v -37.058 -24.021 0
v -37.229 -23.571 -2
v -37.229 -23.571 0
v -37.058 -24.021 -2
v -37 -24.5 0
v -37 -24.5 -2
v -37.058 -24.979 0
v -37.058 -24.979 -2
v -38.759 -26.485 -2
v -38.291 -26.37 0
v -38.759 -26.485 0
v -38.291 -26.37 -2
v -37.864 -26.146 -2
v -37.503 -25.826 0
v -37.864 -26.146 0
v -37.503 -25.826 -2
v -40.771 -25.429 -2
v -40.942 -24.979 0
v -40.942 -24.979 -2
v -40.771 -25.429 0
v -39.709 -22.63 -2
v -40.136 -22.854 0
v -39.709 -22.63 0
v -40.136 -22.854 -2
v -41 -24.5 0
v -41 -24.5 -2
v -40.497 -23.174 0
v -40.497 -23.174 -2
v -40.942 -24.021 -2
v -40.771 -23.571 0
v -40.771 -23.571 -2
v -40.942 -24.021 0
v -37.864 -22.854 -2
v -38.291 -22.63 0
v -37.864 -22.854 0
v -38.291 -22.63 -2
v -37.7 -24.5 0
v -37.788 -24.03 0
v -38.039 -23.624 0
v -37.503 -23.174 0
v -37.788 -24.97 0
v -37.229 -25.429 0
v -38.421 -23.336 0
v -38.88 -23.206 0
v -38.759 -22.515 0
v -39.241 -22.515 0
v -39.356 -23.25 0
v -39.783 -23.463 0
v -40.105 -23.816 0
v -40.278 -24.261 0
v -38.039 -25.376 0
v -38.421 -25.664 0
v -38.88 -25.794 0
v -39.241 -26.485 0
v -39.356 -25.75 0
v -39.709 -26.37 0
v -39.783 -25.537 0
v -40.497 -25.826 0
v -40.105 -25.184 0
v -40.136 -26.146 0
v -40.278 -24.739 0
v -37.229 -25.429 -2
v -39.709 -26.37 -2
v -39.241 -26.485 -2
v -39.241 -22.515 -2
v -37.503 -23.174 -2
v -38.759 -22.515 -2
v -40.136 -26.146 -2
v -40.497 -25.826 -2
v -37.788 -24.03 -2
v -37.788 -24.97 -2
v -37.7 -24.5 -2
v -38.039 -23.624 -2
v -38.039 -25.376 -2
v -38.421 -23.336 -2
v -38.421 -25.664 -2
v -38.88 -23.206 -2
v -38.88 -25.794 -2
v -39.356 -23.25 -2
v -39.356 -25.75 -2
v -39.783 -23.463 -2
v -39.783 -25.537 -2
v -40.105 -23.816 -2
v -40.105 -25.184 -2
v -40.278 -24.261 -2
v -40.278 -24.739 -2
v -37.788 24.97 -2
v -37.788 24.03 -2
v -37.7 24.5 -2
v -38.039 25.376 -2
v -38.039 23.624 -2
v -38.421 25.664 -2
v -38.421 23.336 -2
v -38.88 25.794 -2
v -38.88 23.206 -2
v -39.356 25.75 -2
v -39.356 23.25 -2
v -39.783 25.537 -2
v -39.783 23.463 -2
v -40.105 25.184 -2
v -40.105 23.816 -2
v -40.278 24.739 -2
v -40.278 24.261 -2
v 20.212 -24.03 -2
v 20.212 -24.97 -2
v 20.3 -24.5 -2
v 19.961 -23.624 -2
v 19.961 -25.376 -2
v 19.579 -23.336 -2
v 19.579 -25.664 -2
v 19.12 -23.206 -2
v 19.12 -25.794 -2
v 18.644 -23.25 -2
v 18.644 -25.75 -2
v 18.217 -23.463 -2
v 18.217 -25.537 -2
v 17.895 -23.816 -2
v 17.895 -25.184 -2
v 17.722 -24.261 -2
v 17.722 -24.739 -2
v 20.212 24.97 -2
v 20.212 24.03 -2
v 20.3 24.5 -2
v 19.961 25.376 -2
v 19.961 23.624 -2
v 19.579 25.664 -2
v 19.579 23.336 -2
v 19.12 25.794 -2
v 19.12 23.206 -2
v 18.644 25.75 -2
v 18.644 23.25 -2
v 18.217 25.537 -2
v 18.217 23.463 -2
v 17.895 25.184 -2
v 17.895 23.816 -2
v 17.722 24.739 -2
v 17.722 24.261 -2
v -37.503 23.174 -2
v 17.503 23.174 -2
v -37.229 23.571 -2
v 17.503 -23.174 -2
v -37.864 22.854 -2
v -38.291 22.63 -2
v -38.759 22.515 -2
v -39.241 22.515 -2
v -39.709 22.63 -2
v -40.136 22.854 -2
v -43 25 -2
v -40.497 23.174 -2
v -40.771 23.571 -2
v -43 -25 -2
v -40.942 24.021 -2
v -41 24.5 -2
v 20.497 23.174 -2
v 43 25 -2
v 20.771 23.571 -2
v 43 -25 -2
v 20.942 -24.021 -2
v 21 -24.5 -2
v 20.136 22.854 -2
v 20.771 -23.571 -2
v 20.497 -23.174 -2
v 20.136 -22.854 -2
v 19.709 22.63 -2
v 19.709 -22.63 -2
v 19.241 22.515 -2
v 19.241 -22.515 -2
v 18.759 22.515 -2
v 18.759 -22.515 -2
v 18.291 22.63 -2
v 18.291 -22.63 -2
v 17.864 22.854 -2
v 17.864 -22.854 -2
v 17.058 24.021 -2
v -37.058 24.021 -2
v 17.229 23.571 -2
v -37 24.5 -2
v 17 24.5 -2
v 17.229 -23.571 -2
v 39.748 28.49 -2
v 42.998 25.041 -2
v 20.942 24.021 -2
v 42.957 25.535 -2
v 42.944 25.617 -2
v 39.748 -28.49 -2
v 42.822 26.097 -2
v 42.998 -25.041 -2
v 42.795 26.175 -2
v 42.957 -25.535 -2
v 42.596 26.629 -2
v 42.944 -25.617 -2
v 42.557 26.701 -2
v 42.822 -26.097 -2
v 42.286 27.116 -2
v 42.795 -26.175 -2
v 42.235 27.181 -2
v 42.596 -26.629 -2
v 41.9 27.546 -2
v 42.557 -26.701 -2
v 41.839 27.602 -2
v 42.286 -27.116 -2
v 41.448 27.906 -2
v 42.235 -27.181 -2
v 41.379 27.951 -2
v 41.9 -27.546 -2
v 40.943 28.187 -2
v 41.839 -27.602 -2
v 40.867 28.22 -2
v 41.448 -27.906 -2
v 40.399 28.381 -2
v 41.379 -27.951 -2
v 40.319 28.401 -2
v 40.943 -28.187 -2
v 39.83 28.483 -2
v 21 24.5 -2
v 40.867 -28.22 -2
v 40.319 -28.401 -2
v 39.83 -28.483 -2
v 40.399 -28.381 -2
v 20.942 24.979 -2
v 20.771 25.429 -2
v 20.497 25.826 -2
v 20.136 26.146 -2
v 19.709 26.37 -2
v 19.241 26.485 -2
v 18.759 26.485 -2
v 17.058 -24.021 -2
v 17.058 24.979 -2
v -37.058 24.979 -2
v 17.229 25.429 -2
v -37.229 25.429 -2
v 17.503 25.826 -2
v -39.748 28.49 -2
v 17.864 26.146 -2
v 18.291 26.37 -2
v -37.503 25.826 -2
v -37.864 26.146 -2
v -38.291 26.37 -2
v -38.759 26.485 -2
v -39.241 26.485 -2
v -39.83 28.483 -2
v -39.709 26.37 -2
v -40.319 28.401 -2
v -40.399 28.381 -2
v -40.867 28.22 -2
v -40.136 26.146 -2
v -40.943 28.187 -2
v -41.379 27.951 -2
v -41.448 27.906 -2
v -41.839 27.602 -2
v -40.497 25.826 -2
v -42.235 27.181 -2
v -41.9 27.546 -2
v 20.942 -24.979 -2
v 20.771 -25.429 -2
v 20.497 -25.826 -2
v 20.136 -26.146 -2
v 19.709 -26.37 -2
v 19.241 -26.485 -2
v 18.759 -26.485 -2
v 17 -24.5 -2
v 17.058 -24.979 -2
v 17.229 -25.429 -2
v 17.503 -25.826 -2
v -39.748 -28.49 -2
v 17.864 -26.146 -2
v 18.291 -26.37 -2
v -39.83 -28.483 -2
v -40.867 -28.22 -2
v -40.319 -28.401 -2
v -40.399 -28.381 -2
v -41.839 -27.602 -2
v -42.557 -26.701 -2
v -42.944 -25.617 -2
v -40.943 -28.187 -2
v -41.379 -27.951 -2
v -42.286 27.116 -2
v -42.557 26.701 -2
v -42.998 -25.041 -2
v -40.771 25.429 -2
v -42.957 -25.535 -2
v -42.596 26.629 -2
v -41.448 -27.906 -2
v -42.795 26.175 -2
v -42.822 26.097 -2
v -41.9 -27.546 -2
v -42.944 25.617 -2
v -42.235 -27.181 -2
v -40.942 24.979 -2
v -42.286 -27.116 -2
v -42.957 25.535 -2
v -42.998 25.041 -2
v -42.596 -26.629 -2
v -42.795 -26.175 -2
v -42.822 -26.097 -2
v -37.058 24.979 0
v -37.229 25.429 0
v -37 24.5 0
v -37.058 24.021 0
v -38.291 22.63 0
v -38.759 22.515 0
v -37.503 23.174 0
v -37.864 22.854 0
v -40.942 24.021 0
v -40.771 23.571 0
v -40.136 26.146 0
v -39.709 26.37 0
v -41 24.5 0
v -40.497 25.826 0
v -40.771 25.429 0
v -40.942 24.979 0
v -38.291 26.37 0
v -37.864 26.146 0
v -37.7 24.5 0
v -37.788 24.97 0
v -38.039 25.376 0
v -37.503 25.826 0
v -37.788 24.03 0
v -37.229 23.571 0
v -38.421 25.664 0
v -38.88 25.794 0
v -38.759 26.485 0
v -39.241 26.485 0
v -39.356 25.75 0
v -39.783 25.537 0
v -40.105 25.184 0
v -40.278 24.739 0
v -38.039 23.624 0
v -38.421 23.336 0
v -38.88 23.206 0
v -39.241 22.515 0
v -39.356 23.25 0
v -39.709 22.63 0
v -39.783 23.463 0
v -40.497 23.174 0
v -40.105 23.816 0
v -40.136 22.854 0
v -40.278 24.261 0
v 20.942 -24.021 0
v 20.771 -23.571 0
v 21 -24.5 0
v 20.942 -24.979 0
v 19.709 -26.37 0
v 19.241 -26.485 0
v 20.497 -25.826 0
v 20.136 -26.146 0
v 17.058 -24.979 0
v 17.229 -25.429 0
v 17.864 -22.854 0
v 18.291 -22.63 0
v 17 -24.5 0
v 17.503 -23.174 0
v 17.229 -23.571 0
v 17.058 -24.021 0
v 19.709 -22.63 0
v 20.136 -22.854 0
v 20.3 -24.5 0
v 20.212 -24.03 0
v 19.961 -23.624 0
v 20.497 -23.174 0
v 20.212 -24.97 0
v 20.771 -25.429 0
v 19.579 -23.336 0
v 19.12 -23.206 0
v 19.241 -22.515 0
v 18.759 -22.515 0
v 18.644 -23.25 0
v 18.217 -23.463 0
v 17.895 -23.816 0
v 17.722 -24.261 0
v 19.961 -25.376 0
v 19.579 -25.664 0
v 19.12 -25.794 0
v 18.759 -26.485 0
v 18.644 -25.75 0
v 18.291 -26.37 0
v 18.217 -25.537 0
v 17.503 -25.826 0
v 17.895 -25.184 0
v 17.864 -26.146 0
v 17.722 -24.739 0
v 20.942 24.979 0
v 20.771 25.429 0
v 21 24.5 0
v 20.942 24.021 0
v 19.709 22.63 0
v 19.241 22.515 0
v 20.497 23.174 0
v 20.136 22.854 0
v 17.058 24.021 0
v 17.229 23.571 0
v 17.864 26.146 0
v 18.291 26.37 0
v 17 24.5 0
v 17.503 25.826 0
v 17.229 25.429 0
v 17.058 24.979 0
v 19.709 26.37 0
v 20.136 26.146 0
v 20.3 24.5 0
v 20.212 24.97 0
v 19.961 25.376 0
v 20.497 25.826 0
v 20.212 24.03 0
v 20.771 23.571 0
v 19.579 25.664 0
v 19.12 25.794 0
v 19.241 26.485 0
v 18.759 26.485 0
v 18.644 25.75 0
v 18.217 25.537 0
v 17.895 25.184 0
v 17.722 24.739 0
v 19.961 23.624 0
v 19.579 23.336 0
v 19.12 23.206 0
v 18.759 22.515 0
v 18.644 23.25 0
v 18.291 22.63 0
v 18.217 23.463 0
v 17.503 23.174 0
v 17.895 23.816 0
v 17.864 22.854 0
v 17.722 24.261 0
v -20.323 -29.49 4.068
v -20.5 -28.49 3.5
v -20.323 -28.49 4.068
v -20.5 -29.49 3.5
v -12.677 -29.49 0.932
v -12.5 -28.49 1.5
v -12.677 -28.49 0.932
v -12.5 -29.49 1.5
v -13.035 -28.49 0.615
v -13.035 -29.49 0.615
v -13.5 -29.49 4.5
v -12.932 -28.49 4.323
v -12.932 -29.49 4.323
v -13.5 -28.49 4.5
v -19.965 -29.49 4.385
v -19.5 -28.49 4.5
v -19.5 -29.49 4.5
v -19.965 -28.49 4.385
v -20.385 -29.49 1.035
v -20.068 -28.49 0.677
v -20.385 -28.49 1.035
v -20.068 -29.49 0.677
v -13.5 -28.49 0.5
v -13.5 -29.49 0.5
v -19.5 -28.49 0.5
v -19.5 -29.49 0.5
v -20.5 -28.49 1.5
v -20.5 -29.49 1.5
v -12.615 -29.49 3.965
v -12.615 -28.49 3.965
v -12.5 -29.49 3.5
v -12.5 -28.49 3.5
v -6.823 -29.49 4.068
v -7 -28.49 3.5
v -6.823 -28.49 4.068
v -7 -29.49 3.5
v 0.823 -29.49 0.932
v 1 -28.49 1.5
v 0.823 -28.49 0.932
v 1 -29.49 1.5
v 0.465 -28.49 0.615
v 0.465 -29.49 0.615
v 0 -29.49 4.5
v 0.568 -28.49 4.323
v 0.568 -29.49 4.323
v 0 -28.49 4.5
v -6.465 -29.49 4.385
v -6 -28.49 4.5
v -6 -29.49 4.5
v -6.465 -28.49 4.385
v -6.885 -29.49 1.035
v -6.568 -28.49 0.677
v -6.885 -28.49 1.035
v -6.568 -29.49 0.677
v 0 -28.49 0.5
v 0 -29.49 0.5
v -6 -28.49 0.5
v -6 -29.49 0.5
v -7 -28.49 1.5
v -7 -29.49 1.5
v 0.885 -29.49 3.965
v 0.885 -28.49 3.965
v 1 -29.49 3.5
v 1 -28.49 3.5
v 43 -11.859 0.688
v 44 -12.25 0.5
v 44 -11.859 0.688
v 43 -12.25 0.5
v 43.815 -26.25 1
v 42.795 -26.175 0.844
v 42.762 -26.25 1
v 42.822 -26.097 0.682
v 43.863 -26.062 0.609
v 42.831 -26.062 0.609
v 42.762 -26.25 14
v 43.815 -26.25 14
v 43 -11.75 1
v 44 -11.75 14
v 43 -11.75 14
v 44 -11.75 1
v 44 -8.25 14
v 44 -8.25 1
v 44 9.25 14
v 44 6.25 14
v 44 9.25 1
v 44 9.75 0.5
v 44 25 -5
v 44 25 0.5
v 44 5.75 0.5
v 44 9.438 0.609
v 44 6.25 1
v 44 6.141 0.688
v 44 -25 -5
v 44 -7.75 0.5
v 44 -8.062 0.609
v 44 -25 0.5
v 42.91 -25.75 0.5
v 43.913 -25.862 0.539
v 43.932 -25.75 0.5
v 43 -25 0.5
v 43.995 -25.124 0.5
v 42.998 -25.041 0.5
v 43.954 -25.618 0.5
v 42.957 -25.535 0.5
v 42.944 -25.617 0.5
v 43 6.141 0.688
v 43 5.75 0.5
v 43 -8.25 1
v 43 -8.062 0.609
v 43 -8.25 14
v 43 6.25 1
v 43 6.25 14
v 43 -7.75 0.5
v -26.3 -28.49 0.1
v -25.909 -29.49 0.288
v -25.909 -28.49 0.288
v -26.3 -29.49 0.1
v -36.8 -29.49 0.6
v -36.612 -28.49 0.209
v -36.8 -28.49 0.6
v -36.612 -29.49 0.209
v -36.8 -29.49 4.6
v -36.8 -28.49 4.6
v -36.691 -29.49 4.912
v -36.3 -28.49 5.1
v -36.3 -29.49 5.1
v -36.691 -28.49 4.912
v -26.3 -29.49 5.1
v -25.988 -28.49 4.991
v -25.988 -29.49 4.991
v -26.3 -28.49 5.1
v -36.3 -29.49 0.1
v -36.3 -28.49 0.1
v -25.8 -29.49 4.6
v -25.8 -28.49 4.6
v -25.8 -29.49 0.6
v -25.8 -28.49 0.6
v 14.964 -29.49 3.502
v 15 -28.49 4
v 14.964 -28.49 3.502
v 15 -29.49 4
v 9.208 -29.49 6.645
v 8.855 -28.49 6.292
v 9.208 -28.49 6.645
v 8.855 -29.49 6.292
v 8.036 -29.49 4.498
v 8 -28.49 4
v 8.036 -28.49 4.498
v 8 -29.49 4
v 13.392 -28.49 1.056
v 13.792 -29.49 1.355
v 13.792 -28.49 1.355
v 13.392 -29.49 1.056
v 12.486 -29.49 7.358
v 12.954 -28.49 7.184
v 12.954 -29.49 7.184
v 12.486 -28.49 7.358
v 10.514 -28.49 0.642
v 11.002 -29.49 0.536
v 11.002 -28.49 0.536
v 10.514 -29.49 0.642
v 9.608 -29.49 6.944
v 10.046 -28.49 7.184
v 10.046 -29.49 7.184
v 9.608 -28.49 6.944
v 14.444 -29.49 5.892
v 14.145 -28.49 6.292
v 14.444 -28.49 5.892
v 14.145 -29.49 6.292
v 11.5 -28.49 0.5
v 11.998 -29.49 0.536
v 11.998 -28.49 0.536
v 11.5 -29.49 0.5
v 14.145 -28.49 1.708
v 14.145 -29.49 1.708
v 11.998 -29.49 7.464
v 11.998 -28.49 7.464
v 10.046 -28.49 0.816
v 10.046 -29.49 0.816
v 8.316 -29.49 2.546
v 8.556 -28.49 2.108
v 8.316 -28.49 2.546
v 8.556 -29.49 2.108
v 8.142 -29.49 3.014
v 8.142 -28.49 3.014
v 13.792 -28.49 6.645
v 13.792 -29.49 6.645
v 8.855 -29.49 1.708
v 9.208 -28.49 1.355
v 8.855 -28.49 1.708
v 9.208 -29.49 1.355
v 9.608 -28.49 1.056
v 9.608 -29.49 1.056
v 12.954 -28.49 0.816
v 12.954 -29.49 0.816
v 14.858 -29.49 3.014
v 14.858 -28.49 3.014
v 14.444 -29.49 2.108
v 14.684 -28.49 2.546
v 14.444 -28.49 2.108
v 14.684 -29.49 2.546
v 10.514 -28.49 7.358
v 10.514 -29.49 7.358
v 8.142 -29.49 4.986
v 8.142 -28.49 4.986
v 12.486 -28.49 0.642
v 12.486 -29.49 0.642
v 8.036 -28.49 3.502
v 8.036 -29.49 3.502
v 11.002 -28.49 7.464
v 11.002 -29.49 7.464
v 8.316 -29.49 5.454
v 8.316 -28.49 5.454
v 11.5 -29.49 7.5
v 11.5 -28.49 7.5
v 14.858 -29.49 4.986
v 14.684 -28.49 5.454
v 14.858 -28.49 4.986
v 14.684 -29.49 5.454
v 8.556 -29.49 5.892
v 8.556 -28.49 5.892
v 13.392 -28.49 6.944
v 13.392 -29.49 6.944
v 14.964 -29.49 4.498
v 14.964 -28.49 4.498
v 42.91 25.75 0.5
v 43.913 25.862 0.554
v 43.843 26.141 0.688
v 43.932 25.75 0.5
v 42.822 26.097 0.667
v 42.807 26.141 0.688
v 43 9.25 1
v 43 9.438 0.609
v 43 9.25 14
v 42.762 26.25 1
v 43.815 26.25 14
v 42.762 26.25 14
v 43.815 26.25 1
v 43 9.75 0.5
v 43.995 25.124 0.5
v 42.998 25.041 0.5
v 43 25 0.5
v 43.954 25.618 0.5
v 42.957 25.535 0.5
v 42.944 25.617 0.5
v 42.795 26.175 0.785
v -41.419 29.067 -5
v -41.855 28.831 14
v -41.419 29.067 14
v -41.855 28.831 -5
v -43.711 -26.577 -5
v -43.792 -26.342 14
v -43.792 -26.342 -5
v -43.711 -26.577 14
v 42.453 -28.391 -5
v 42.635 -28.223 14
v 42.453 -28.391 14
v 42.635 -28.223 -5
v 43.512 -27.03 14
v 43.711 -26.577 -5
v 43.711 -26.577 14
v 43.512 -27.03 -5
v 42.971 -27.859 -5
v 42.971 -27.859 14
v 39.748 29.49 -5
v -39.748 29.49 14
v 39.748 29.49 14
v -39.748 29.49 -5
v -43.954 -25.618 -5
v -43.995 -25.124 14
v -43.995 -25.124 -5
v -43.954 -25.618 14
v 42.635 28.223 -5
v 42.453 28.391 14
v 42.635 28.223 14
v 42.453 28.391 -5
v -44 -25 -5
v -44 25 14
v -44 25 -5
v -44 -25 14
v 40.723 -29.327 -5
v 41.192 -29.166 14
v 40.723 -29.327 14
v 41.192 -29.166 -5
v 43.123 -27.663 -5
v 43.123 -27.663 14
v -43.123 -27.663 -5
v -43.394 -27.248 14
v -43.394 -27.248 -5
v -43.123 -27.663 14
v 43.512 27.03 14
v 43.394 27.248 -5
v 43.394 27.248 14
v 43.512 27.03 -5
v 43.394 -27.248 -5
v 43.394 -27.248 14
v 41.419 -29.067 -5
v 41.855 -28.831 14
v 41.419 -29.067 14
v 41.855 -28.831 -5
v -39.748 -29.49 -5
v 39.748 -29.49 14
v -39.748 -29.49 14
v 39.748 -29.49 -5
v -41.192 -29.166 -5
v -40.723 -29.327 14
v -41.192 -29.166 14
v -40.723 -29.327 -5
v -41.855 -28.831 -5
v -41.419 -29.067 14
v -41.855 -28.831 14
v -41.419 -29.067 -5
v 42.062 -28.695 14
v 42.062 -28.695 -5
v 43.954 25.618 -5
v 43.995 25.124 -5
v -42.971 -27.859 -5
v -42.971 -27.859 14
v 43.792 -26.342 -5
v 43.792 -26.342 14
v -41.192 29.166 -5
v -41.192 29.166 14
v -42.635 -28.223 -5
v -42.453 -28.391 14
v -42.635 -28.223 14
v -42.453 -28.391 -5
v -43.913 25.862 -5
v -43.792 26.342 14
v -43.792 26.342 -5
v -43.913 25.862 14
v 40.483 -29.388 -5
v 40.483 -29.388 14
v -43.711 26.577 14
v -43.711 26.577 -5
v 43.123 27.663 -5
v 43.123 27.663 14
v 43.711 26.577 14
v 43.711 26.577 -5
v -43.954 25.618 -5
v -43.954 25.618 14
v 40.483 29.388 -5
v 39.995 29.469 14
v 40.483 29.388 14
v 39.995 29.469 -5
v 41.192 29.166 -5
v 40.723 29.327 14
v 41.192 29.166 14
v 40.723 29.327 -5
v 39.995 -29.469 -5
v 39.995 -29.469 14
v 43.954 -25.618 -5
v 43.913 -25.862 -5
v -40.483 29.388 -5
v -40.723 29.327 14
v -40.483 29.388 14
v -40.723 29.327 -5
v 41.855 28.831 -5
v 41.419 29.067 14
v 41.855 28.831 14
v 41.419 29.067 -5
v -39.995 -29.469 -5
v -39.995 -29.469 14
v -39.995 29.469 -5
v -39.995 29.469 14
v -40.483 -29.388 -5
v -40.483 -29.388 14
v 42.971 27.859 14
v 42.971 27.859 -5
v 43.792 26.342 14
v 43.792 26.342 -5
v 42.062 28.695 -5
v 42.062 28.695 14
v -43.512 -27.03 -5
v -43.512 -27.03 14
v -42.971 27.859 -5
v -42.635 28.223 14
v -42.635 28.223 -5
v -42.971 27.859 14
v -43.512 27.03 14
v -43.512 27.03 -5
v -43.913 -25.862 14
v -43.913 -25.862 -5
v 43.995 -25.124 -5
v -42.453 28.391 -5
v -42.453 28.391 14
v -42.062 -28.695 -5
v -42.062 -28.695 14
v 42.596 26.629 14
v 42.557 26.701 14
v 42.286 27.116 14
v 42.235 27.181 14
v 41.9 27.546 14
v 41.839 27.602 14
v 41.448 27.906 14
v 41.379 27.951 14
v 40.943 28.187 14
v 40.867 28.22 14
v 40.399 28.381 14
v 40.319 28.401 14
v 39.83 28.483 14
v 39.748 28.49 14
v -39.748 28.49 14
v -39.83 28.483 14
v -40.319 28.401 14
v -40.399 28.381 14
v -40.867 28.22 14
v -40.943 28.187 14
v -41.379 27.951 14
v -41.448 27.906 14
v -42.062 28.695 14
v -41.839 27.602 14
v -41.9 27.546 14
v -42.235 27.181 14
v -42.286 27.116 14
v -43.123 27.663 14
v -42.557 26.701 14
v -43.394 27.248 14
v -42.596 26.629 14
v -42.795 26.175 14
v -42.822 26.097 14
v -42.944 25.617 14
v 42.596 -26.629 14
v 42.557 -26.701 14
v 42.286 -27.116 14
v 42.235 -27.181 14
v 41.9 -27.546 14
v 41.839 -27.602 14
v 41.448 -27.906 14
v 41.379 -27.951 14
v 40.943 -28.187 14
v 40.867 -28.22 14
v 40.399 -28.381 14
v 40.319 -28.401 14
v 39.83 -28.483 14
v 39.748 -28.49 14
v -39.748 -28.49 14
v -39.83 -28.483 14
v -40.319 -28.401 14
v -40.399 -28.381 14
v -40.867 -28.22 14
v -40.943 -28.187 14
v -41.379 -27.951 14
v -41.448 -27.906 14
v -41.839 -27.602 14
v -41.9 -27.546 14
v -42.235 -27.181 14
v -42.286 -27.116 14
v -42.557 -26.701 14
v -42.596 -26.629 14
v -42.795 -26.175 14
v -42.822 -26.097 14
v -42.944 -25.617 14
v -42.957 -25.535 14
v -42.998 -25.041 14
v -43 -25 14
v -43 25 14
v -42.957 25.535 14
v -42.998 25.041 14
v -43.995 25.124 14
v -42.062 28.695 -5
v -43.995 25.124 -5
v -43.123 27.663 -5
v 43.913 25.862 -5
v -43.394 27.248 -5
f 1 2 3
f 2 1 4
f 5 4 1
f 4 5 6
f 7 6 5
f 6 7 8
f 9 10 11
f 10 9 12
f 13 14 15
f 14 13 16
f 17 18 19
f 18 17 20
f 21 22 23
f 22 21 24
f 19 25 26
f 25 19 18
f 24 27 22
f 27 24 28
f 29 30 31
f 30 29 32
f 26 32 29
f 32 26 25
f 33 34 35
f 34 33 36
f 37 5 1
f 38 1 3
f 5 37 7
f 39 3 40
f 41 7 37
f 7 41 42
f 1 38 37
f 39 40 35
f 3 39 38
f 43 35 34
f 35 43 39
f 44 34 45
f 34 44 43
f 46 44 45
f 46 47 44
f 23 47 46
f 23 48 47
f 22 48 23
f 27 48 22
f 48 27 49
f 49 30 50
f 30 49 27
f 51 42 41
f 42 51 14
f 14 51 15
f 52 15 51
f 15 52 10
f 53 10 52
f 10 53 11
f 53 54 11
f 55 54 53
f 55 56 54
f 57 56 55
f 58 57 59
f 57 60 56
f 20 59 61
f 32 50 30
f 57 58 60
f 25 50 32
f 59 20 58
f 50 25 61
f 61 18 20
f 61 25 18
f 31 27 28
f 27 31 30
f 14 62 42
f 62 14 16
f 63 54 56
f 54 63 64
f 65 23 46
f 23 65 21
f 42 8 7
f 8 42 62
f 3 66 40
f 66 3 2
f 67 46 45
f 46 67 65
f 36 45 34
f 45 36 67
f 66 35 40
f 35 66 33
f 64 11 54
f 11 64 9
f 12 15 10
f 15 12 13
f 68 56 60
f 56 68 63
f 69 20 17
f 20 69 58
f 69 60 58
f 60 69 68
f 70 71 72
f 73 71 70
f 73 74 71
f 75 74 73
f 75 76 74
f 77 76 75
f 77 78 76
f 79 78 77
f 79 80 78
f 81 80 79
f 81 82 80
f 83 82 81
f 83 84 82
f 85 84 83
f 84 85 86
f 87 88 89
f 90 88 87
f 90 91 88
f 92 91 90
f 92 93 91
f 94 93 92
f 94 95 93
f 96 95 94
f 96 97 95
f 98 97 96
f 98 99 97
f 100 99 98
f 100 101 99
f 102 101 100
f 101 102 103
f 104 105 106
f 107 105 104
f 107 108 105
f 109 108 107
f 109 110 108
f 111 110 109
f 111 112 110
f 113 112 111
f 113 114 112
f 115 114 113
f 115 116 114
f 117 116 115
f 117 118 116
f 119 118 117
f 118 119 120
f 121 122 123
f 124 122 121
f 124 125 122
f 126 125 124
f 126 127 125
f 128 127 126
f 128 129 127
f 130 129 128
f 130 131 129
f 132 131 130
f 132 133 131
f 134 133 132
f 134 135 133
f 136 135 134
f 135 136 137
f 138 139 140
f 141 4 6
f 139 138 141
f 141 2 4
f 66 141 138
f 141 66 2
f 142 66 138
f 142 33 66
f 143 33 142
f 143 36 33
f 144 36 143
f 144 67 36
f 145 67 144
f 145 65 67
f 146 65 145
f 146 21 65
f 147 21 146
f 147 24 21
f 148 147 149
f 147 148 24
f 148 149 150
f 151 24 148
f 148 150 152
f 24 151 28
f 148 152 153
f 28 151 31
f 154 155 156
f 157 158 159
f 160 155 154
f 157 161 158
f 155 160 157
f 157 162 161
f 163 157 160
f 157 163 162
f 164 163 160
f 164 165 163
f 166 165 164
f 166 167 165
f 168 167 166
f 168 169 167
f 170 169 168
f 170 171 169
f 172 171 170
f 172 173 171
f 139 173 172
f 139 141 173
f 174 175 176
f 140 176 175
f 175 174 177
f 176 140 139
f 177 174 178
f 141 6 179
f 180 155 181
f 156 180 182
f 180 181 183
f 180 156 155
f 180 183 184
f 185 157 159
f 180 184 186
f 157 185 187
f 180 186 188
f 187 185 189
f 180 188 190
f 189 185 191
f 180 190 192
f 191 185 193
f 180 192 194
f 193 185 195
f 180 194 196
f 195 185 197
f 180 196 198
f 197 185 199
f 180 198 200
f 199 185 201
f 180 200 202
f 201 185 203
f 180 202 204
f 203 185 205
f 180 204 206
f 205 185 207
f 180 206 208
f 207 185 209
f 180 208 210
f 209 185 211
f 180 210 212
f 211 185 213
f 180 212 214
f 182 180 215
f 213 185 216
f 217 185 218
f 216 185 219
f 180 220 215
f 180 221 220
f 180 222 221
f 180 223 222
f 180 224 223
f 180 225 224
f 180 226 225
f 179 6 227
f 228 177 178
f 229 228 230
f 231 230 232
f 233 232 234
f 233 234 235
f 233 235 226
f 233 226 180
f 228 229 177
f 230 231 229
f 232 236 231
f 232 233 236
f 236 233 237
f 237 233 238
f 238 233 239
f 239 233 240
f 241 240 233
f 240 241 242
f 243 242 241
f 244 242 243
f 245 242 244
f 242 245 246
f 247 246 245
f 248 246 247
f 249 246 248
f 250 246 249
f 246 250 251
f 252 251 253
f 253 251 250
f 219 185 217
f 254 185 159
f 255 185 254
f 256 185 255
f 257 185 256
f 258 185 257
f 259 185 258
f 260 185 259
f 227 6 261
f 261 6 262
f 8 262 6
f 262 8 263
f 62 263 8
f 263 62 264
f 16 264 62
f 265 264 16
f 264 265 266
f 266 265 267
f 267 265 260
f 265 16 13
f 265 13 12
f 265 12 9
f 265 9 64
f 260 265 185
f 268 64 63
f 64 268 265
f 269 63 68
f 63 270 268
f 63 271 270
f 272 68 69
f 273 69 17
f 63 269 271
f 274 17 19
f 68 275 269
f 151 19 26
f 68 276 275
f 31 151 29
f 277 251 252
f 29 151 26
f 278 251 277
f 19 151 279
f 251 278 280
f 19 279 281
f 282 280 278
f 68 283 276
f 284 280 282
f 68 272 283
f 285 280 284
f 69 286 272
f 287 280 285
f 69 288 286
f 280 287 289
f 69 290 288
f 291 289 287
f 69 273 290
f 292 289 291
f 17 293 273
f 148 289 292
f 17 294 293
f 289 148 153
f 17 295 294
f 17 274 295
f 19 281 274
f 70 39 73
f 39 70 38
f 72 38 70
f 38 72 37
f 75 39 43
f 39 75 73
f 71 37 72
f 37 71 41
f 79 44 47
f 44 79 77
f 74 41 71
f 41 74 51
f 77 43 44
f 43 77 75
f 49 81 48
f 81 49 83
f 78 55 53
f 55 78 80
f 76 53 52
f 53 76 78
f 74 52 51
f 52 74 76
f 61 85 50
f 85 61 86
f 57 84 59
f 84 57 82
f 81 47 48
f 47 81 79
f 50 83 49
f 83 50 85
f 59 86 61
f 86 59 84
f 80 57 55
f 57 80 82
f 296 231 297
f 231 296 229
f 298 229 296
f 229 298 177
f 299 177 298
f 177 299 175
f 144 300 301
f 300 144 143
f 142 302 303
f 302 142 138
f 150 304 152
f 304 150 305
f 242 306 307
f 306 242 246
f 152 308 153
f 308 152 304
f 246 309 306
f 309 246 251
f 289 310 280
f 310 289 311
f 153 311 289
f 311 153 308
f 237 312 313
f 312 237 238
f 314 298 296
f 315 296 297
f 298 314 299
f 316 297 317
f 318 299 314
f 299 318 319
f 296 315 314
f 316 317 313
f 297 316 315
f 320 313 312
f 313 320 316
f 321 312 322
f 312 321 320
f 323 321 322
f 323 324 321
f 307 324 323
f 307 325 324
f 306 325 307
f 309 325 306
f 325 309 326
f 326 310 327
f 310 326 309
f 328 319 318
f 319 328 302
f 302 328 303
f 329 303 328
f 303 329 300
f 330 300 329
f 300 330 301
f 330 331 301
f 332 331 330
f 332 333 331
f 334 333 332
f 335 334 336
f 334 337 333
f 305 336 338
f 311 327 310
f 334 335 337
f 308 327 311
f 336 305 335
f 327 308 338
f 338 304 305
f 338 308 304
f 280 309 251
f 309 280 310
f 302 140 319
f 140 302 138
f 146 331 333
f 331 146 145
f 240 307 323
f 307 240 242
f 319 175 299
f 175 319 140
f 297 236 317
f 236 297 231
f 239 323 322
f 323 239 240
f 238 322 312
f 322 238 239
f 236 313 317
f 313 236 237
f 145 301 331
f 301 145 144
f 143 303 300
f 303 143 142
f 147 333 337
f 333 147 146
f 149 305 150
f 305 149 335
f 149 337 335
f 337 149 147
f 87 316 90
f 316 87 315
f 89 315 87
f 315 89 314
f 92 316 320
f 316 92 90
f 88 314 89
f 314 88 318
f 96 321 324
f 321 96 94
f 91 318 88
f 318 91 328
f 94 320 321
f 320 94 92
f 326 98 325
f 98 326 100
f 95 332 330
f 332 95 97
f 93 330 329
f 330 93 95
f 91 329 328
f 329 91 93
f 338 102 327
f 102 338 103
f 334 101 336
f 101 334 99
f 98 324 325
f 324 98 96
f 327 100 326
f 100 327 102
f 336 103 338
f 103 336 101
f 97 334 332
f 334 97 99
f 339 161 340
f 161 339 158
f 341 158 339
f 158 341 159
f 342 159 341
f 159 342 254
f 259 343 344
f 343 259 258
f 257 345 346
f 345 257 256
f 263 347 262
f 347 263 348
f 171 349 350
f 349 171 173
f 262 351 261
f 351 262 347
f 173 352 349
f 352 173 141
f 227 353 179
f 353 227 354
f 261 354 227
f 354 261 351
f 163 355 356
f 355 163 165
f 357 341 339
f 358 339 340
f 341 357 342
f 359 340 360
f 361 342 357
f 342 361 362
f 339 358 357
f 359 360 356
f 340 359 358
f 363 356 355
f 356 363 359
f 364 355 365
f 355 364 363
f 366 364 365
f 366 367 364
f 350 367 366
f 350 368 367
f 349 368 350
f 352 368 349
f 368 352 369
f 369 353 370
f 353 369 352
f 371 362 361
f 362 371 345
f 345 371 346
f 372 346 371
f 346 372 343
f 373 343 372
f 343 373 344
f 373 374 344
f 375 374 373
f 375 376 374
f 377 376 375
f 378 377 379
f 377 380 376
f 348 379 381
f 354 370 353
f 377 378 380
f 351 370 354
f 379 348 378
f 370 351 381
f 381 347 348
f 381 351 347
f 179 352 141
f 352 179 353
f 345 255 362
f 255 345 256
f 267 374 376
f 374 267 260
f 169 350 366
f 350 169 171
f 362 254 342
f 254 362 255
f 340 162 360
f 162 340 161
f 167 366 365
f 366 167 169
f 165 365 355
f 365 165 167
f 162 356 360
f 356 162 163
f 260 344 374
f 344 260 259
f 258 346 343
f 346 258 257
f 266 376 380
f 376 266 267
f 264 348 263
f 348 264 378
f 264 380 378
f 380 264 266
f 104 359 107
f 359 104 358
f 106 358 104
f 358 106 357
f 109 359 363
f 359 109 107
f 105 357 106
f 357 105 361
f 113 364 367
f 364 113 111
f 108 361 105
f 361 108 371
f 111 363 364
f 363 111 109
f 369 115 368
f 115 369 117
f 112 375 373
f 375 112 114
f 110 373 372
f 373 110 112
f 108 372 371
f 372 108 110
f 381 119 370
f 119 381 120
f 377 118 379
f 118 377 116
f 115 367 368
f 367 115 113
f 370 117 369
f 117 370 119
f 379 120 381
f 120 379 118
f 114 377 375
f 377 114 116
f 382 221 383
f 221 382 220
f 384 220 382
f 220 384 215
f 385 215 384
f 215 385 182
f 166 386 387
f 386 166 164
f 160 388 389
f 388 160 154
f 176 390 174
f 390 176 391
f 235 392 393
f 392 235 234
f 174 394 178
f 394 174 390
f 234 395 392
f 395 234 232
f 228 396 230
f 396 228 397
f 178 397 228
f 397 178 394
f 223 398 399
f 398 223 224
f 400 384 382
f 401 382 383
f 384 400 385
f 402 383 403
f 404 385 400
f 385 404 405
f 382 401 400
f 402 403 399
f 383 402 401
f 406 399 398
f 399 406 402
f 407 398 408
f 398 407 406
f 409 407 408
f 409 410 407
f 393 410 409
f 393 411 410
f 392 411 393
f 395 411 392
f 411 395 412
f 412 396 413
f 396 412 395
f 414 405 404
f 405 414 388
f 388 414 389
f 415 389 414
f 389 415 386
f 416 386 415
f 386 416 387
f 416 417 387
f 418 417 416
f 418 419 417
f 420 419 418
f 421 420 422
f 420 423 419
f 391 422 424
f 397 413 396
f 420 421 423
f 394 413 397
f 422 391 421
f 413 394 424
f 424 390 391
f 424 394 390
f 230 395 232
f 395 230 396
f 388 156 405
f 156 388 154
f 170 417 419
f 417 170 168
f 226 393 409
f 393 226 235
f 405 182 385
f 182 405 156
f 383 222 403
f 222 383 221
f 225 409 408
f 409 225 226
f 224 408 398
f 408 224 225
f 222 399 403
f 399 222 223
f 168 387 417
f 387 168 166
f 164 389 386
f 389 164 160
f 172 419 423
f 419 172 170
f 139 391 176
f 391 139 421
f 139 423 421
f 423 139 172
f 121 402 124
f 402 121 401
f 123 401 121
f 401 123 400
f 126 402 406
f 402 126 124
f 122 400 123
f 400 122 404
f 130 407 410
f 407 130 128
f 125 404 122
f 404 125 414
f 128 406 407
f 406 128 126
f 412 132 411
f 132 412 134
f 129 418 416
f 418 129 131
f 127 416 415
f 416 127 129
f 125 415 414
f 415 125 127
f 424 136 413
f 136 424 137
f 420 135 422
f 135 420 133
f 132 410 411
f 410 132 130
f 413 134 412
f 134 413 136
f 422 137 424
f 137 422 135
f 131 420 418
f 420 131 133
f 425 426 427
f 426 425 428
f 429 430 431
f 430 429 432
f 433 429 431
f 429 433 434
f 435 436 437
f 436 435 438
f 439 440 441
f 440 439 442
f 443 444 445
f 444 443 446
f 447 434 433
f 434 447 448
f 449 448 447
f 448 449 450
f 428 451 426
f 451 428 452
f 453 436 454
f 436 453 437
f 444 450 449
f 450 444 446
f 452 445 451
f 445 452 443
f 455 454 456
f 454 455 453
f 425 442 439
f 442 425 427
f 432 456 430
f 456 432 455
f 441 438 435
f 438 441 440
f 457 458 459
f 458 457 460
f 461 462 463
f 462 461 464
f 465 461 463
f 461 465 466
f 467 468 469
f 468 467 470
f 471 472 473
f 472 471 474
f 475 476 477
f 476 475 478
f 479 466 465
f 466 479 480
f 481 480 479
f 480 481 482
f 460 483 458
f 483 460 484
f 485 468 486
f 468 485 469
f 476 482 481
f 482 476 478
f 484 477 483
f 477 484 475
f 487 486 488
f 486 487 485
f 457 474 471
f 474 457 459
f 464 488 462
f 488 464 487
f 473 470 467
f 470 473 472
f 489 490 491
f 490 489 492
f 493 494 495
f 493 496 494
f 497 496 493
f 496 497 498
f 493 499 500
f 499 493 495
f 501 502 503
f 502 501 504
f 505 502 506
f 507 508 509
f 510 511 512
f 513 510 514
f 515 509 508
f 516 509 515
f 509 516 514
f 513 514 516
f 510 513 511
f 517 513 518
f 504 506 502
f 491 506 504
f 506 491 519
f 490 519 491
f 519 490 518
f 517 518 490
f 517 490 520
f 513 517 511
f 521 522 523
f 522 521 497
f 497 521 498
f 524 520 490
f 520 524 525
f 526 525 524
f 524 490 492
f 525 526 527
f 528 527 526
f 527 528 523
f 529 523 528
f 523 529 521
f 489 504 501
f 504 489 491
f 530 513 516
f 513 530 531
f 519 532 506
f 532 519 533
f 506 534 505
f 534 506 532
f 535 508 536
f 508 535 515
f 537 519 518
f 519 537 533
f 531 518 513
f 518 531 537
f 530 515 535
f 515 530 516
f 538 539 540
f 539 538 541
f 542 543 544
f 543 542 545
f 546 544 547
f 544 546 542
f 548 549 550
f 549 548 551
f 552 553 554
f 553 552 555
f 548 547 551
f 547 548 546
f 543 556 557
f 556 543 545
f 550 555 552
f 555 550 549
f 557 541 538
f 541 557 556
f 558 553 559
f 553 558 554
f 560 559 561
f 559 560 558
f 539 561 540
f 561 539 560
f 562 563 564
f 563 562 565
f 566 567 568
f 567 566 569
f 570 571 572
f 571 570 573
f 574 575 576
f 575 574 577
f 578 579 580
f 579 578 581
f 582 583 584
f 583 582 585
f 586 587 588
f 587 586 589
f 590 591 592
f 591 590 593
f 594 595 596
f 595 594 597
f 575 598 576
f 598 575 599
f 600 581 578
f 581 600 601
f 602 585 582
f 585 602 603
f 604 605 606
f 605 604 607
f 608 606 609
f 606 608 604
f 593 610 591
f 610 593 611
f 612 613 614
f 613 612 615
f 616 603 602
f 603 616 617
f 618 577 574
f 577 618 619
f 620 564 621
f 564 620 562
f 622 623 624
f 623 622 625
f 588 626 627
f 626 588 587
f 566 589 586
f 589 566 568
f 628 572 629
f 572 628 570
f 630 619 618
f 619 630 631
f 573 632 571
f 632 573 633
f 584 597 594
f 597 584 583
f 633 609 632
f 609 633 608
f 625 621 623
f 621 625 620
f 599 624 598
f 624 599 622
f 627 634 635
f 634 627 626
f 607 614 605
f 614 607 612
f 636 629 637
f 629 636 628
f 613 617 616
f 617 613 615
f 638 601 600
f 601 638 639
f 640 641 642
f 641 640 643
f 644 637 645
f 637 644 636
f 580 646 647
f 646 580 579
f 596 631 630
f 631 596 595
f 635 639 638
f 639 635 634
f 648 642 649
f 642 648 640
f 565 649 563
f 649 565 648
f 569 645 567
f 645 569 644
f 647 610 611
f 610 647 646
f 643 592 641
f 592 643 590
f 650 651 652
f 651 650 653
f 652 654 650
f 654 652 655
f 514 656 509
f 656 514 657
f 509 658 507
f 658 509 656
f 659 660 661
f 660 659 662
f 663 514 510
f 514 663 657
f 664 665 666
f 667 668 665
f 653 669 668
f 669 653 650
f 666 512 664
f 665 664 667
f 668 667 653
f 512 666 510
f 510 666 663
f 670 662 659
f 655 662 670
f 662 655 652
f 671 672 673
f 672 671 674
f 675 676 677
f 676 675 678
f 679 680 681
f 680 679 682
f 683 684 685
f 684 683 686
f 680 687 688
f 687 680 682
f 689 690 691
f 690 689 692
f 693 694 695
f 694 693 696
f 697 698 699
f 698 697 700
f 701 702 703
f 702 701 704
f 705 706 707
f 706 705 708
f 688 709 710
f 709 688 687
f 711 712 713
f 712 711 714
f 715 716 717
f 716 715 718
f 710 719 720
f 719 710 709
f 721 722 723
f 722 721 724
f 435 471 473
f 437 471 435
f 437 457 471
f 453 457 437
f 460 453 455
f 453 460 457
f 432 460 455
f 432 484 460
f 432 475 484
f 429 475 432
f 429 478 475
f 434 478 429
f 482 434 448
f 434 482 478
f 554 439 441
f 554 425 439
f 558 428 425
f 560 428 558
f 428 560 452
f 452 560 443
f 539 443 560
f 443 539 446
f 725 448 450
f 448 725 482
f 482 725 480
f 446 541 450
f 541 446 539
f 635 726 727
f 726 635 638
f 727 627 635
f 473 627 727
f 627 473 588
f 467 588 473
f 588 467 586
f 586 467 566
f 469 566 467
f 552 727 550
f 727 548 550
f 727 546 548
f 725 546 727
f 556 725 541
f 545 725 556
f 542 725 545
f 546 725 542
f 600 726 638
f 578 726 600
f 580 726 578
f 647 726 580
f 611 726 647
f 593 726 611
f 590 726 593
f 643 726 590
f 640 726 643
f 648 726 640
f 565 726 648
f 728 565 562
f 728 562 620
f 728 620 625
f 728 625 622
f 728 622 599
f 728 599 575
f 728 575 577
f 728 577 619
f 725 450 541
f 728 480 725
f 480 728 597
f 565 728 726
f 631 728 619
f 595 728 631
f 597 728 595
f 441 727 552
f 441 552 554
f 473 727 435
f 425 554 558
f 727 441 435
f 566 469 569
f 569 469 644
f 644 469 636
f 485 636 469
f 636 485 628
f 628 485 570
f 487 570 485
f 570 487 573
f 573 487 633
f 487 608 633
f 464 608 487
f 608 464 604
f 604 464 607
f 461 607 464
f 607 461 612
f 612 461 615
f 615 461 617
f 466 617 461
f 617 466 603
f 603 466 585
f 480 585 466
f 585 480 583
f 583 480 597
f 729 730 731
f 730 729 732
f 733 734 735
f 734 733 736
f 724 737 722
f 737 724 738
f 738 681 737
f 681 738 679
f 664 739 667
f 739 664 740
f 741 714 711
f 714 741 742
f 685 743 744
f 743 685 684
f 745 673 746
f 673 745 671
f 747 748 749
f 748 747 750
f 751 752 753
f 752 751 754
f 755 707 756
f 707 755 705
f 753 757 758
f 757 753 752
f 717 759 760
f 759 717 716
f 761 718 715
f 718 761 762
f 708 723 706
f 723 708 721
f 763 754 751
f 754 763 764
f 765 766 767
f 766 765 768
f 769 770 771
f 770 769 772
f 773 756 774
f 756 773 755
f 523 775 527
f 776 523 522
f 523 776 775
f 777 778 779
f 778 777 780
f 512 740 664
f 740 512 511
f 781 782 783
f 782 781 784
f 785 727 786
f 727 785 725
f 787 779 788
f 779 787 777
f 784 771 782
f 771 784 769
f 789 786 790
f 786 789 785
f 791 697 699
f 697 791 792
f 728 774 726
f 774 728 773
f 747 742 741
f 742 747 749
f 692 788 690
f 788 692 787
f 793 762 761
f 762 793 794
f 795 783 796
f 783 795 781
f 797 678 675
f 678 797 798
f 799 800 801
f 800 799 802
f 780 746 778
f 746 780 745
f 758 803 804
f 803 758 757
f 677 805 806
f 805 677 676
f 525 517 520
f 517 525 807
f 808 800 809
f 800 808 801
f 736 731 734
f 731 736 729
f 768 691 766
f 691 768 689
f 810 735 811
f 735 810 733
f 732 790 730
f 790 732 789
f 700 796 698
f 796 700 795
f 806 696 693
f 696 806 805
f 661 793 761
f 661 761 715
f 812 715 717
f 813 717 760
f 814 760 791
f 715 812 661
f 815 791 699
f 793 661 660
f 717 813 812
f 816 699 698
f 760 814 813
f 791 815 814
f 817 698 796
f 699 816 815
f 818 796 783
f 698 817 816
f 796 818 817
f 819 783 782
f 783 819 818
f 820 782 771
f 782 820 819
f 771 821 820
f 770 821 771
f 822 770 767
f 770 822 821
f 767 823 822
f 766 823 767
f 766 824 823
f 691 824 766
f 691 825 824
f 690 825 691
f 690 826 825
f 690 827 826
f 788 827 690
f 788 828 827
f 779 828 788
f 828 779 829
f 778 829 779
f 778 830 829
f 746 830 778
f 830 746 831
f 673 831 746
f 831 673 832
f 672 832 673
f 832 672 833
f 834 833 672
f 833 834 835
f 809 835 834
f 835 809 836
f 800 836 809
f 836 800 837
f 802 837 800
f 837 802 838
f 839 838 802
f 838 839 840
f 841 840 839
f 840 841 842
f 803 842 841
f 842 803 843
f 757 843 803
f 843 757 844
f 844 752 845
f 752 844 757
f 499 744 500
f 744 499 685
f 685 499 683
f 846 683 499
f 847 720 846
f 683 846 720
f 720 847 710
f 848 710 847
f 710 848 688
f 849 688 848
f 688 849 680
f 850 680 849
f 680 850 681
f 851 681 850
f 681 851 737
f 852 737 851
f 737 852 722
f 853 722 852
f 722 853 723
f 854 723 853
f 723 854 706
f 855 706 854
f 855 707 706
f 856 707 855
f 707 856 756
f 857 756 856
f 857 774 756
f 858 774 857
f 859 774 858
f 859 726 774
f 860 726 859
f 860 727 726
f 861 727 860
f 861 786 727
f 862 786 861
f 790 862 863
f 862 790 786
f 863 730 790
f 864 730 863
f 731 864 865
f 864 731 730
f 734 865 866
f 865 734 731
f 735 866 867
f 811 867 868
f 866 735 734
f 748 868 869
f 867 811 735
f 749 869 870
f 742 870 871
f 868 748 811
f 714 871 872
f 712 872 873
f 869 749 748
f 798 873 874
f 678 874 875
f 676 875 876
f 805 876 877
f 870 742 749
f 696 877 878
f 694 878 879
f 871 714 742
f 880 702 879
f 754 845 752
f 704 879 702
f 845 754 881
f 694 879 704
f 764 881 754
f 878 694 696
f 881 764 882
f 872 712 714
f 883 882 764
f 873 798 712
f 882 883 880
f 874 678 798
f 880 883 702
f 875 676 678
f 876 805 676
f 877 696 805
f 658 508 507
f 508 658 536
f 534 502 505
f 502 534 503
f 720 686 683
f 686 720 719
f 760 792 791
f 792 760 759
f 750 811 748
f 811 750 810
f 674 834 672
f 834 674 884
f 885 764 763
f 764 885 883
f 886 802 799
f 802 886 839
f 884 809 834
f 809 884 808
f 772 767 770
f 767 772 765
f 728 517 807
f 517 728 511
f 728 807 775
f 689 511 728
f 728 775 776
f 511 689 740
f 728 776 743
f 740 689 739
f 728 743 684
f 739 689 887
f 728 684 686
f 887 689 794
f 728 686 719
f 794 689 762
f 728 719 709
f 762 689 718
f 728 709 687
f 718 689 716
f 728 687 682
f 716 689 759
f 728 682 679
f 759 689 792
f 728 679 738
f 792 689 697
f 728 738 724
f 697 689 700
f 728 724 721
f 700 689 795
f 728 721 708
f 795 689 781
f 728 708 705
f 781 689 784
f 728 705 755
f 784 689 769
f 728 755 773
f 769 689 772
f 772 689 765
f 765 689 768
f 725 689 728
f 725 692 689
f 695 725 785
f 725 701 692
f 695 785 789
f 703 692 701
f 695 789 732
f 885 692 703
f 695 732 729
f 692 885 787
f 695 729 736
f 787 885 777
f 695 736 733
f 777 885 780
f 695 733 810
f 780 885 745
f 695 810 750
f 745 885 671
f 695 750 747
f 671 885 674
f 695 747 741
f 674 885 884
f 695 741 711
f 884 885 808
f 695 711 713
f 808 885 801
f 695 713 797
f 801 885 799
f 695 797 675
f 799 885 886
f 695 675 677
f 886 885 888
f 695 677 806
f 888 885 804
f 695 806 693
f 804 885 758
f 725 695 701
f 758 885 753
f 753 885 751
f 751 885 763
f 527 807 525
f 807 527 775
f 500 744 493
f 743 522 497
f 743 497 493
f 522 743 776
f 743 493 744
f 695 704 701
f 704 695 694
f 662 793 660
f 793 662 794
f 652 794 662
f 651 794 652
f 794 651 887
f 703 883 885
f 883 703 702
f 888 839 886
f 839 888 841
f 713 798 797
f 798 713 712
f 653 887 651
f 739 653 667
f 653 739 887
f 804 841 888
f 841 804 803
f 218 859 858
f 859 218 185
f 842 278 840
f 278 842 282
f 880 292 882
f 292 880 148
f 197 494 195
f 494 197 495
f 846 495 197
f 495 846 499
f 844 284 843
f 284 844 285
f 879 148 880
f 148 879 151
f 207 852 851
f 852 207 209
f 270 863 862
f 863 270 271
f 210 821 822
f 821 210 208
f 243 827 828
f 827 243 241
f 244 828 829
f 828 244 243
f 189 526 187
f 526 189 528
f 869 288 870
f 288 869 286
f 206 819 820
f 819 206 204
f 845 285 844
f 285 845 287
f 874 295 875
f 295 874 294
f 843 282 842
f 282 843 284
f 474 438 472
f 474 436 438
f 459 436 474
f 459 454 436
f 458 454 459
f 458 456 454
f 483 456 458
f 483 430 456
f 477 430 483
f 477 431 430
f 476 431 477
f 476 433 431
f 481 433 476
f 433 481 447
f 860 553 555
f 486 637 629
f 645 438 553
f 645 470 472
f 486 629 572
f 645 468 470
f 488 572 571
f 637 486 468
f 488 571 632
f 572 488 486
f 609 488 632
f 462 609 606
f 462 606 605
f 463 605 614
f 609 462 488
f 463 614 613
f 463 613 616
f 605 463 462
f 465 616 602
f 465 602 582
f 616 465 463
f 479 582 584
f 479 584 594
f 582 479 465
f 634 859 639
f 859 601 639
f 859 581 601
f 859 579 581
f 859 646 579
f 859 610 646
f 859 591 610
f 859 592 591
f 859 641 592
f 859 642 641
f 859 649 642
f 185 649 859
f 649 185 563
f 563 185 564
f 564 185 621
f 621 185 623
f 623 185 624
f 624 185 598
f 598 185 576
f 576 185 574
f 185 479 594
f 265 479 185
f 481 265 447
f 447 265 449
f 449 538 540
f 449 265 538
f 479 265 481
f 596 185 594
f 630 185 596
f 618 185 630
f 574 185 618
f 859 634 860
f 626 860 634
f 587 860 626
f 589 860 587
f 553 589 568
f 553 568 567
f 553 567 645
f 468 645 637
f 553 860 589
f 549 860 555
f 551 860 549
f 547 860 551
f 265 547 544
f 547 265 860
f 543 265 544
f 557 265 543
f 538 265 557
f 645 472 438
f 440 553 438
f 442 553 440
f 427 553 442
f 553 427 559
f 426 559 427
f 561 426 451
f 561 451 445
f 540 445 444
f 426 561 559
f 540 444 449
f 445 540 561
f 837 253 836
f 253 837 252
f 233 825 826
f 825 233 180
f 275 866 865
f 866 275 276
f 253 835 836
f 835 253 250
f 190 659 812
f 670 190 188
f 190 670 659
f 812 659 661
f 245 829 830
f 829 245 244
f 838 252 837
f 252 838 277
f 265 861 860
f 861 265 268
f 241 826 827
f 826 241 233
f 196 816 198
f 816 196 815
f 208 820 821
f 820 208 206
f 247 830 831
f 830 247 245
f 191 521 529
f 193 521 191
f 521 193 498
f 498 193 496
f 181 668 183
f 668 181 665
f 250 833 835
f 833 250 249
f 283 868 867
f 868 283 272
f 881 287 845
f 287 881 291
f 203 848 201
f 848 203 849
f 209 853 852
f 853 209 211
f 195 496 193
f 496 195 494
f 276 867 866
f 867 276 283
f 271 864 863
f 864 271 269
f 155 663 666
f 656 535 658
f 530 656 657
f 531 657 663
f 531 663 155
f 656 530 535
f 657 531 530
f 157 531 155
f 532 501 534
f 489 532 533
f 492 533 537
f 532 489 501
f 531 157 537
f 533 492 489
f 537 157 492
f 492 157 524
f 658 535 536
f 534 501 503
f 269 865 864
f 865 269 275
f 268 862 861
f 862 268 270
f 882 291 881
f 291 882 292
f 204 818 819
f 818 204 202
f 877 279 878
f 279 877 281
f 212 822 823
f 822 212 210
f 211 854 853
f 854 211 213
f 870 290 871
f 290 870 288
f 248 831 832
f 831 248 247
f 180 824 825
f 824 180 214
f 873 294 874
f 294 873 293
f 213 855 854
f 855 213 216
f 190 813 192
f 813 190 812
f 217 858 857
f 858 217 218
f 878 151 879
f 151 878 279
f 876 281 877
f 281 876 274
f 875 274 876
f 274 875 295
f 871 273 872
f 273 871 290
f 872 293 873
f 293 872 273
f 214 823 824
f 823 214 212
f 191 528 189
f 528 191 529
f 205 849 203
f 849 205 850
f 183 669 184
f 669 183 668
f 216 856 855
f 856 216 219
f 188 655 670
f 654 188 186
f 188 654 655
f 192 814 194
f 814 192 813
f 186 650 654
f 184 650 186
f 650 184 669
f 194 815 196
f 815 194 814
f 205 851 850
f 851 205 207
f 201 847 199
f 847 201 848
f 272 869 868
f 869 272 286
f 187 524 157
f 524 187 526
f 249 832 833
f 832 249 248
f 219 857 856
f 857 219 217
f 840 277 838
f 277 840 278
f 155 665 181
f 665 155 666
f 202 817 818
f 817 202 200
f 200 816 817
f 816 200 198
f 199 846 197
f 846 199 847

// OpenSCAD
/*[Board selection]*/
boardSize="B"; // [A, B]
boardVersion=4; // [1,2,3,4]
boardVariant=""; // [Standard, Plus]

/* [Margins] */
// the margin between the board and the case
sideMargin=.5;
// margin around connectors
connectorHoleMargin=.5;
// space between the bottom of the board and the floor of the case
bottomMargin=2;

/*[Thickness]*/
// Thickness of the base
baseThickness=3;
// Thickness of the side walls
wallThickness=1;

/*[Resolution]*/
$fs=.5;
$fa=5;

/* [Hidden] */
// The below are not configurable
boardThickness=1;
boardCornerRadius=3;
mountingHoleXoffset=58;
mountingHoleYoffset=49;
MIN=-1;
CENTER=0;
MAX=1;

function getBoardLength() = boardSize=="B"?85:65;
function getBoardHeight() = 56;
function getBoardMaxZ()=boardThickness+16;

module alignToBoard(x=CENTER, y=CENTER, z=CENTER) {
  translate([x*getBoardLength()/2, y*getBoardHeight()/2, z*boardThickness]) {
    children();
  }
}

module alignToMountingHoles(z=MIN) {
  for (x=[MIN, MAX]) {
    for (y=[MIN, MAX]) {
      alignToMountingHole(x,y, z) children();
    }
  }
}

module alignToMountingHole(x=MIN, y=MIN, z=CENTER) {
  alignToBoard(MIN, MIN, z){
    translate([3.5, 3.5, 0]) {
      translate([(x+1)/2*mountingHoleXoffset, (y+1)/2*mountingHoleYoffset, 0]) {
        children();
      }
    }
  }
}

module boardOutline(holes=true) {
  circleXoffset=getBoardLength()-boardCornerRadius*2;
  circleYoffset=getBoardHeight()-boardCornerRadius*2;
  difference() {
    hull() {
      for (x=[0:1]) {
        for (y=[0:1]) {
          translate([-circleXoffset/2+x*circleXoffset, -circleYoffset/2+y*circleYoffset, 0]) {
            circle(r=boardCornerRadius);
          }
        }
      }
    }
    if (holes) {
      alignToMountingHoles() circle(r=2.8/2);;
    }
  }
}

module board() {
  linear_extrude(height=boardThickness, center=true, convexity=10, twist=0) {
    boardOutline();
  }
}

module alignToPowerConnector() {
  xoffset=(boardSize=="B" && boardVersion>=4)?(3.5+7.7):(10.6);
  alignToBoard(MIN, MIN, MAX){
    translate([xoffset, 0, 3.2/2]) {
      children();
    }
  }
}

module alignToHdmi0() {
  alignToBoard(MIN, MIN, MAX){
    translate([3.5+7.7+14.8, 0, 3/2]) {
      children();
    }
  }
}

module alignToHdmi1() {
  alignToHdmi0()
    translate([13.5, 0, 0])
      children();
}

module alignToAudioJack() {
  xoffset=(boardSize=="B" && boardVersion>=4)?(3.5+7.7+14.8+13.5+7+7.5):53.5;
  alignToBoard(MIN, MIN, MAX) translate([xoffset, 0, 6/2]) {
    children();
  }
}

module powerConnectorOutline(margin=connectorHoleMargin) {
  if (boardSize=="B" && boardVersion>=4) {
    offset(r=margin)
      square(size=[10,4], center=true); // 9.1x3.8
  } else {
    offset(r=margin)
    square(size=[10,4], center=true); // 9.1x3.8
  }
}

module powerConnectorHole() {
  alignToPowerConnector() hdmiSideHole() powerConnectorOutline();
}

module hdmiSideHole() {
  translate([0, -sideMargin, 0]) {
    rotate([90, 0, 0]) {
      linear_extrude(height=wallThickness*2, center=true, convexity=10, twist=0) {
        children();
      }
    }
  }
}

module microHdmiHoleOutline(margin=1) {
  offset(r=margin)
  square(size=[6, 2], center=true);
}

module hdmi0hole() {
  alignToHdmi0(){
    hdmiSideHole(){
      microHdmiHoleOutline();
    }
  }
}

module hdmi1hole() {
  alignToHdmi1(){
    hdmiSideHole(){
      microHdmiHoleOutline();
    }
  }
}

module audioJackHole() {
  alignToAudioJack() hdmiSideHole() circle(d=6+connectorHoleMargin*2); // 6 measured
}

module hdmiConnectorOutline(margin=1) {
  offset(r=margin)
  square(size=[14, 4.5], center=true);
}

module hdmiHoles() {
  if (boardSize=="B" && boardVersion==4) {
    hdmi0hole();
    hdmi1hole();
  } else {
    alignToHdmi() hdmiSideHole() hdmiConnectorOutline();
  }
}

module alignToHdmi() {
  alignToBoard(MIN, MIN, MAX) translate([32, 0, 6.5/2]) children();
}

module usbHoleOutline(margin=.5) {
  height=(boardSize=="B")?16:8; // FIX height for model A
  offset(r=margin)
  square(size=[13.5, height], center=true);
}

module alignToUsbLeft() {
  yOffset=(boardVersion>=4)?9:29;
  alignToBoard(MAX, MIN, MAX) translate([0, yOffset, 16/2]) children();
}

module alignToUsbRight() {
  yoffset=(boardVersion>=4)?(27-9):(47-29);
  alignToUsbLeft() translate([0, yoffset, 0]) children();
}

module usbSideHole() {
  rotate([0, 0, 90]) hdmiSideHole() children();
}

module usbHoleLeft() {
  alignToUsbLeft() usbSideHole() usbHoleOutline();
}

module usbHoleRight() {
  alignToUsbRight() usbSideHole() usbHoleOutline();
}

module alignToUsb() {
  alignToBoard(MAX, MIN, MAX) translate([0, 29, 8/2]) children();
}

module singleUsbHole(margin=connectorHoleMargin) {
  alignToUsb() usbSideHole() usbHoleOutline();
}

module usbHoles() {
  if (boardSize=="A") {
    singleUsbHole();
  } else{
    if (boardVersion==4 || boardVersion>1 || boardVersion==1&&boardVariant=="Plus") {
      usbHoleLeft();
      usbHoleRight();
    } else {
      #linear_extrude(height=10, center=true, convexity=10, twist=0) {
        text("Unsupported", size=10, font="Liberation Sans", halign="left", valign="baseline",
          spacing=1.0, direction="ltr", language="en", script="latin");
      }
    }
  }
}

module alignToEthPort() {
  yOffset=(boardVersion>=4)?45.75:10.25;
  alignToBoard(MAX, MIN, MAX) translate([0, yOffset, 13.5/2]) children();
}

module ethHoleOutline(margin=.5) {
  offset(r=margin)
  square(size=[16, 13.5], center=true);
}

module ethHoles() {
  if (boardSize!="A") {
    alignToEthPort() usbSideHole() ethHoleOutline();
  }
}

module caseHoles() {
  powerConnectorHole();
  hdmiHoles();
  audioJackHole();
  usbHoles();
  ethHoles();
}

module basicCaseShell(height=0, wallThickness=wallThickness, sideMargin=sideMargin, baseThickness=baseThickness, bottomMargin=bottomMargin) {
  caseShellHeight=(height>0)?height:getBoardMaxZ()+baseThickness+bottomMargin;
  translate([0, 0, -baseThickness-bottomMargin]) {
    translate([0, 0, baseThickness]) {
      alignToMountingHoles(z=CENTER){
        difference() {
          cylinder(d=4, h=bottomMargin, center=false);
          cylinder(d=2.6, h=bottomMargin, center=false);
        }
      }
    }
    alignToBoard(CENTER, CENTER, CENTER){
      difference() {
        // outside of shell
        linear_extrude(height=caseShellHeight, center=false, convexity=10, twist=0) {
          offset(r=wallThickness+sideMargin)
          boardOutline(holes=false);
        }
        // inside of shell
        translate([0, 0, baseThickness]) {
          linear_extrude(height=caseShellHeight, center=false, convexity=10, twist=0) {
            offset(r=sideMargin)
            boardOutline(holes=false);
          }
        }
        //holes
        translate([0, 0, baseThickness+bottomMargin]) {
          caseHoles();
        }
      }
    }
  }
}

side=40;
sideRoundingRadius=2;
thickness=11;
screwHoleRadius=3/2;
// distances from outside
fanDistanceFromEdge=.5;
holeDistanceFromEdge=2;

module roundedRectangle(sides=[10,10], roundingRadius=1) {
  xoffset=sides[0]-roundingRadius*2;
  yoffset=sides[1]-roundingRadius*2;
  translate([-xoffset/2, -yoffset/2, 0]) {
    hull() {
      for (x=[0:1]) {
        for (y=[0:1]) {
          translate([x*xoffset, y*yoffset, 0]) {
            circle(r=roundingRadius);
          }
        }
      }
    }
  }
}

module roundedSquare(side, roundingRadius=1) {
  roundedRectangle([side, side], roundingRadius);
}

module fan(cubeMargin=0) {
  alignToBoard(MIN, MAX, MAX)
  translate([side/2, -side/2, 12]) {
    minkowski() {
      linear_extrude(height=11, center=true, convexity=10, twist=0) {
        roundedSquare(side, sideRoundingRadius);
      }
      cube(size=[cubeMargin, cubeMargin, cubeMargin], center=true);
    }
  }
}

/* board(); */
difference() {
  union() {
    basicCaseShell(height=baseThickness+boardThickness+bottomMargin+getBoardMaxZ()-4);
  }
}
